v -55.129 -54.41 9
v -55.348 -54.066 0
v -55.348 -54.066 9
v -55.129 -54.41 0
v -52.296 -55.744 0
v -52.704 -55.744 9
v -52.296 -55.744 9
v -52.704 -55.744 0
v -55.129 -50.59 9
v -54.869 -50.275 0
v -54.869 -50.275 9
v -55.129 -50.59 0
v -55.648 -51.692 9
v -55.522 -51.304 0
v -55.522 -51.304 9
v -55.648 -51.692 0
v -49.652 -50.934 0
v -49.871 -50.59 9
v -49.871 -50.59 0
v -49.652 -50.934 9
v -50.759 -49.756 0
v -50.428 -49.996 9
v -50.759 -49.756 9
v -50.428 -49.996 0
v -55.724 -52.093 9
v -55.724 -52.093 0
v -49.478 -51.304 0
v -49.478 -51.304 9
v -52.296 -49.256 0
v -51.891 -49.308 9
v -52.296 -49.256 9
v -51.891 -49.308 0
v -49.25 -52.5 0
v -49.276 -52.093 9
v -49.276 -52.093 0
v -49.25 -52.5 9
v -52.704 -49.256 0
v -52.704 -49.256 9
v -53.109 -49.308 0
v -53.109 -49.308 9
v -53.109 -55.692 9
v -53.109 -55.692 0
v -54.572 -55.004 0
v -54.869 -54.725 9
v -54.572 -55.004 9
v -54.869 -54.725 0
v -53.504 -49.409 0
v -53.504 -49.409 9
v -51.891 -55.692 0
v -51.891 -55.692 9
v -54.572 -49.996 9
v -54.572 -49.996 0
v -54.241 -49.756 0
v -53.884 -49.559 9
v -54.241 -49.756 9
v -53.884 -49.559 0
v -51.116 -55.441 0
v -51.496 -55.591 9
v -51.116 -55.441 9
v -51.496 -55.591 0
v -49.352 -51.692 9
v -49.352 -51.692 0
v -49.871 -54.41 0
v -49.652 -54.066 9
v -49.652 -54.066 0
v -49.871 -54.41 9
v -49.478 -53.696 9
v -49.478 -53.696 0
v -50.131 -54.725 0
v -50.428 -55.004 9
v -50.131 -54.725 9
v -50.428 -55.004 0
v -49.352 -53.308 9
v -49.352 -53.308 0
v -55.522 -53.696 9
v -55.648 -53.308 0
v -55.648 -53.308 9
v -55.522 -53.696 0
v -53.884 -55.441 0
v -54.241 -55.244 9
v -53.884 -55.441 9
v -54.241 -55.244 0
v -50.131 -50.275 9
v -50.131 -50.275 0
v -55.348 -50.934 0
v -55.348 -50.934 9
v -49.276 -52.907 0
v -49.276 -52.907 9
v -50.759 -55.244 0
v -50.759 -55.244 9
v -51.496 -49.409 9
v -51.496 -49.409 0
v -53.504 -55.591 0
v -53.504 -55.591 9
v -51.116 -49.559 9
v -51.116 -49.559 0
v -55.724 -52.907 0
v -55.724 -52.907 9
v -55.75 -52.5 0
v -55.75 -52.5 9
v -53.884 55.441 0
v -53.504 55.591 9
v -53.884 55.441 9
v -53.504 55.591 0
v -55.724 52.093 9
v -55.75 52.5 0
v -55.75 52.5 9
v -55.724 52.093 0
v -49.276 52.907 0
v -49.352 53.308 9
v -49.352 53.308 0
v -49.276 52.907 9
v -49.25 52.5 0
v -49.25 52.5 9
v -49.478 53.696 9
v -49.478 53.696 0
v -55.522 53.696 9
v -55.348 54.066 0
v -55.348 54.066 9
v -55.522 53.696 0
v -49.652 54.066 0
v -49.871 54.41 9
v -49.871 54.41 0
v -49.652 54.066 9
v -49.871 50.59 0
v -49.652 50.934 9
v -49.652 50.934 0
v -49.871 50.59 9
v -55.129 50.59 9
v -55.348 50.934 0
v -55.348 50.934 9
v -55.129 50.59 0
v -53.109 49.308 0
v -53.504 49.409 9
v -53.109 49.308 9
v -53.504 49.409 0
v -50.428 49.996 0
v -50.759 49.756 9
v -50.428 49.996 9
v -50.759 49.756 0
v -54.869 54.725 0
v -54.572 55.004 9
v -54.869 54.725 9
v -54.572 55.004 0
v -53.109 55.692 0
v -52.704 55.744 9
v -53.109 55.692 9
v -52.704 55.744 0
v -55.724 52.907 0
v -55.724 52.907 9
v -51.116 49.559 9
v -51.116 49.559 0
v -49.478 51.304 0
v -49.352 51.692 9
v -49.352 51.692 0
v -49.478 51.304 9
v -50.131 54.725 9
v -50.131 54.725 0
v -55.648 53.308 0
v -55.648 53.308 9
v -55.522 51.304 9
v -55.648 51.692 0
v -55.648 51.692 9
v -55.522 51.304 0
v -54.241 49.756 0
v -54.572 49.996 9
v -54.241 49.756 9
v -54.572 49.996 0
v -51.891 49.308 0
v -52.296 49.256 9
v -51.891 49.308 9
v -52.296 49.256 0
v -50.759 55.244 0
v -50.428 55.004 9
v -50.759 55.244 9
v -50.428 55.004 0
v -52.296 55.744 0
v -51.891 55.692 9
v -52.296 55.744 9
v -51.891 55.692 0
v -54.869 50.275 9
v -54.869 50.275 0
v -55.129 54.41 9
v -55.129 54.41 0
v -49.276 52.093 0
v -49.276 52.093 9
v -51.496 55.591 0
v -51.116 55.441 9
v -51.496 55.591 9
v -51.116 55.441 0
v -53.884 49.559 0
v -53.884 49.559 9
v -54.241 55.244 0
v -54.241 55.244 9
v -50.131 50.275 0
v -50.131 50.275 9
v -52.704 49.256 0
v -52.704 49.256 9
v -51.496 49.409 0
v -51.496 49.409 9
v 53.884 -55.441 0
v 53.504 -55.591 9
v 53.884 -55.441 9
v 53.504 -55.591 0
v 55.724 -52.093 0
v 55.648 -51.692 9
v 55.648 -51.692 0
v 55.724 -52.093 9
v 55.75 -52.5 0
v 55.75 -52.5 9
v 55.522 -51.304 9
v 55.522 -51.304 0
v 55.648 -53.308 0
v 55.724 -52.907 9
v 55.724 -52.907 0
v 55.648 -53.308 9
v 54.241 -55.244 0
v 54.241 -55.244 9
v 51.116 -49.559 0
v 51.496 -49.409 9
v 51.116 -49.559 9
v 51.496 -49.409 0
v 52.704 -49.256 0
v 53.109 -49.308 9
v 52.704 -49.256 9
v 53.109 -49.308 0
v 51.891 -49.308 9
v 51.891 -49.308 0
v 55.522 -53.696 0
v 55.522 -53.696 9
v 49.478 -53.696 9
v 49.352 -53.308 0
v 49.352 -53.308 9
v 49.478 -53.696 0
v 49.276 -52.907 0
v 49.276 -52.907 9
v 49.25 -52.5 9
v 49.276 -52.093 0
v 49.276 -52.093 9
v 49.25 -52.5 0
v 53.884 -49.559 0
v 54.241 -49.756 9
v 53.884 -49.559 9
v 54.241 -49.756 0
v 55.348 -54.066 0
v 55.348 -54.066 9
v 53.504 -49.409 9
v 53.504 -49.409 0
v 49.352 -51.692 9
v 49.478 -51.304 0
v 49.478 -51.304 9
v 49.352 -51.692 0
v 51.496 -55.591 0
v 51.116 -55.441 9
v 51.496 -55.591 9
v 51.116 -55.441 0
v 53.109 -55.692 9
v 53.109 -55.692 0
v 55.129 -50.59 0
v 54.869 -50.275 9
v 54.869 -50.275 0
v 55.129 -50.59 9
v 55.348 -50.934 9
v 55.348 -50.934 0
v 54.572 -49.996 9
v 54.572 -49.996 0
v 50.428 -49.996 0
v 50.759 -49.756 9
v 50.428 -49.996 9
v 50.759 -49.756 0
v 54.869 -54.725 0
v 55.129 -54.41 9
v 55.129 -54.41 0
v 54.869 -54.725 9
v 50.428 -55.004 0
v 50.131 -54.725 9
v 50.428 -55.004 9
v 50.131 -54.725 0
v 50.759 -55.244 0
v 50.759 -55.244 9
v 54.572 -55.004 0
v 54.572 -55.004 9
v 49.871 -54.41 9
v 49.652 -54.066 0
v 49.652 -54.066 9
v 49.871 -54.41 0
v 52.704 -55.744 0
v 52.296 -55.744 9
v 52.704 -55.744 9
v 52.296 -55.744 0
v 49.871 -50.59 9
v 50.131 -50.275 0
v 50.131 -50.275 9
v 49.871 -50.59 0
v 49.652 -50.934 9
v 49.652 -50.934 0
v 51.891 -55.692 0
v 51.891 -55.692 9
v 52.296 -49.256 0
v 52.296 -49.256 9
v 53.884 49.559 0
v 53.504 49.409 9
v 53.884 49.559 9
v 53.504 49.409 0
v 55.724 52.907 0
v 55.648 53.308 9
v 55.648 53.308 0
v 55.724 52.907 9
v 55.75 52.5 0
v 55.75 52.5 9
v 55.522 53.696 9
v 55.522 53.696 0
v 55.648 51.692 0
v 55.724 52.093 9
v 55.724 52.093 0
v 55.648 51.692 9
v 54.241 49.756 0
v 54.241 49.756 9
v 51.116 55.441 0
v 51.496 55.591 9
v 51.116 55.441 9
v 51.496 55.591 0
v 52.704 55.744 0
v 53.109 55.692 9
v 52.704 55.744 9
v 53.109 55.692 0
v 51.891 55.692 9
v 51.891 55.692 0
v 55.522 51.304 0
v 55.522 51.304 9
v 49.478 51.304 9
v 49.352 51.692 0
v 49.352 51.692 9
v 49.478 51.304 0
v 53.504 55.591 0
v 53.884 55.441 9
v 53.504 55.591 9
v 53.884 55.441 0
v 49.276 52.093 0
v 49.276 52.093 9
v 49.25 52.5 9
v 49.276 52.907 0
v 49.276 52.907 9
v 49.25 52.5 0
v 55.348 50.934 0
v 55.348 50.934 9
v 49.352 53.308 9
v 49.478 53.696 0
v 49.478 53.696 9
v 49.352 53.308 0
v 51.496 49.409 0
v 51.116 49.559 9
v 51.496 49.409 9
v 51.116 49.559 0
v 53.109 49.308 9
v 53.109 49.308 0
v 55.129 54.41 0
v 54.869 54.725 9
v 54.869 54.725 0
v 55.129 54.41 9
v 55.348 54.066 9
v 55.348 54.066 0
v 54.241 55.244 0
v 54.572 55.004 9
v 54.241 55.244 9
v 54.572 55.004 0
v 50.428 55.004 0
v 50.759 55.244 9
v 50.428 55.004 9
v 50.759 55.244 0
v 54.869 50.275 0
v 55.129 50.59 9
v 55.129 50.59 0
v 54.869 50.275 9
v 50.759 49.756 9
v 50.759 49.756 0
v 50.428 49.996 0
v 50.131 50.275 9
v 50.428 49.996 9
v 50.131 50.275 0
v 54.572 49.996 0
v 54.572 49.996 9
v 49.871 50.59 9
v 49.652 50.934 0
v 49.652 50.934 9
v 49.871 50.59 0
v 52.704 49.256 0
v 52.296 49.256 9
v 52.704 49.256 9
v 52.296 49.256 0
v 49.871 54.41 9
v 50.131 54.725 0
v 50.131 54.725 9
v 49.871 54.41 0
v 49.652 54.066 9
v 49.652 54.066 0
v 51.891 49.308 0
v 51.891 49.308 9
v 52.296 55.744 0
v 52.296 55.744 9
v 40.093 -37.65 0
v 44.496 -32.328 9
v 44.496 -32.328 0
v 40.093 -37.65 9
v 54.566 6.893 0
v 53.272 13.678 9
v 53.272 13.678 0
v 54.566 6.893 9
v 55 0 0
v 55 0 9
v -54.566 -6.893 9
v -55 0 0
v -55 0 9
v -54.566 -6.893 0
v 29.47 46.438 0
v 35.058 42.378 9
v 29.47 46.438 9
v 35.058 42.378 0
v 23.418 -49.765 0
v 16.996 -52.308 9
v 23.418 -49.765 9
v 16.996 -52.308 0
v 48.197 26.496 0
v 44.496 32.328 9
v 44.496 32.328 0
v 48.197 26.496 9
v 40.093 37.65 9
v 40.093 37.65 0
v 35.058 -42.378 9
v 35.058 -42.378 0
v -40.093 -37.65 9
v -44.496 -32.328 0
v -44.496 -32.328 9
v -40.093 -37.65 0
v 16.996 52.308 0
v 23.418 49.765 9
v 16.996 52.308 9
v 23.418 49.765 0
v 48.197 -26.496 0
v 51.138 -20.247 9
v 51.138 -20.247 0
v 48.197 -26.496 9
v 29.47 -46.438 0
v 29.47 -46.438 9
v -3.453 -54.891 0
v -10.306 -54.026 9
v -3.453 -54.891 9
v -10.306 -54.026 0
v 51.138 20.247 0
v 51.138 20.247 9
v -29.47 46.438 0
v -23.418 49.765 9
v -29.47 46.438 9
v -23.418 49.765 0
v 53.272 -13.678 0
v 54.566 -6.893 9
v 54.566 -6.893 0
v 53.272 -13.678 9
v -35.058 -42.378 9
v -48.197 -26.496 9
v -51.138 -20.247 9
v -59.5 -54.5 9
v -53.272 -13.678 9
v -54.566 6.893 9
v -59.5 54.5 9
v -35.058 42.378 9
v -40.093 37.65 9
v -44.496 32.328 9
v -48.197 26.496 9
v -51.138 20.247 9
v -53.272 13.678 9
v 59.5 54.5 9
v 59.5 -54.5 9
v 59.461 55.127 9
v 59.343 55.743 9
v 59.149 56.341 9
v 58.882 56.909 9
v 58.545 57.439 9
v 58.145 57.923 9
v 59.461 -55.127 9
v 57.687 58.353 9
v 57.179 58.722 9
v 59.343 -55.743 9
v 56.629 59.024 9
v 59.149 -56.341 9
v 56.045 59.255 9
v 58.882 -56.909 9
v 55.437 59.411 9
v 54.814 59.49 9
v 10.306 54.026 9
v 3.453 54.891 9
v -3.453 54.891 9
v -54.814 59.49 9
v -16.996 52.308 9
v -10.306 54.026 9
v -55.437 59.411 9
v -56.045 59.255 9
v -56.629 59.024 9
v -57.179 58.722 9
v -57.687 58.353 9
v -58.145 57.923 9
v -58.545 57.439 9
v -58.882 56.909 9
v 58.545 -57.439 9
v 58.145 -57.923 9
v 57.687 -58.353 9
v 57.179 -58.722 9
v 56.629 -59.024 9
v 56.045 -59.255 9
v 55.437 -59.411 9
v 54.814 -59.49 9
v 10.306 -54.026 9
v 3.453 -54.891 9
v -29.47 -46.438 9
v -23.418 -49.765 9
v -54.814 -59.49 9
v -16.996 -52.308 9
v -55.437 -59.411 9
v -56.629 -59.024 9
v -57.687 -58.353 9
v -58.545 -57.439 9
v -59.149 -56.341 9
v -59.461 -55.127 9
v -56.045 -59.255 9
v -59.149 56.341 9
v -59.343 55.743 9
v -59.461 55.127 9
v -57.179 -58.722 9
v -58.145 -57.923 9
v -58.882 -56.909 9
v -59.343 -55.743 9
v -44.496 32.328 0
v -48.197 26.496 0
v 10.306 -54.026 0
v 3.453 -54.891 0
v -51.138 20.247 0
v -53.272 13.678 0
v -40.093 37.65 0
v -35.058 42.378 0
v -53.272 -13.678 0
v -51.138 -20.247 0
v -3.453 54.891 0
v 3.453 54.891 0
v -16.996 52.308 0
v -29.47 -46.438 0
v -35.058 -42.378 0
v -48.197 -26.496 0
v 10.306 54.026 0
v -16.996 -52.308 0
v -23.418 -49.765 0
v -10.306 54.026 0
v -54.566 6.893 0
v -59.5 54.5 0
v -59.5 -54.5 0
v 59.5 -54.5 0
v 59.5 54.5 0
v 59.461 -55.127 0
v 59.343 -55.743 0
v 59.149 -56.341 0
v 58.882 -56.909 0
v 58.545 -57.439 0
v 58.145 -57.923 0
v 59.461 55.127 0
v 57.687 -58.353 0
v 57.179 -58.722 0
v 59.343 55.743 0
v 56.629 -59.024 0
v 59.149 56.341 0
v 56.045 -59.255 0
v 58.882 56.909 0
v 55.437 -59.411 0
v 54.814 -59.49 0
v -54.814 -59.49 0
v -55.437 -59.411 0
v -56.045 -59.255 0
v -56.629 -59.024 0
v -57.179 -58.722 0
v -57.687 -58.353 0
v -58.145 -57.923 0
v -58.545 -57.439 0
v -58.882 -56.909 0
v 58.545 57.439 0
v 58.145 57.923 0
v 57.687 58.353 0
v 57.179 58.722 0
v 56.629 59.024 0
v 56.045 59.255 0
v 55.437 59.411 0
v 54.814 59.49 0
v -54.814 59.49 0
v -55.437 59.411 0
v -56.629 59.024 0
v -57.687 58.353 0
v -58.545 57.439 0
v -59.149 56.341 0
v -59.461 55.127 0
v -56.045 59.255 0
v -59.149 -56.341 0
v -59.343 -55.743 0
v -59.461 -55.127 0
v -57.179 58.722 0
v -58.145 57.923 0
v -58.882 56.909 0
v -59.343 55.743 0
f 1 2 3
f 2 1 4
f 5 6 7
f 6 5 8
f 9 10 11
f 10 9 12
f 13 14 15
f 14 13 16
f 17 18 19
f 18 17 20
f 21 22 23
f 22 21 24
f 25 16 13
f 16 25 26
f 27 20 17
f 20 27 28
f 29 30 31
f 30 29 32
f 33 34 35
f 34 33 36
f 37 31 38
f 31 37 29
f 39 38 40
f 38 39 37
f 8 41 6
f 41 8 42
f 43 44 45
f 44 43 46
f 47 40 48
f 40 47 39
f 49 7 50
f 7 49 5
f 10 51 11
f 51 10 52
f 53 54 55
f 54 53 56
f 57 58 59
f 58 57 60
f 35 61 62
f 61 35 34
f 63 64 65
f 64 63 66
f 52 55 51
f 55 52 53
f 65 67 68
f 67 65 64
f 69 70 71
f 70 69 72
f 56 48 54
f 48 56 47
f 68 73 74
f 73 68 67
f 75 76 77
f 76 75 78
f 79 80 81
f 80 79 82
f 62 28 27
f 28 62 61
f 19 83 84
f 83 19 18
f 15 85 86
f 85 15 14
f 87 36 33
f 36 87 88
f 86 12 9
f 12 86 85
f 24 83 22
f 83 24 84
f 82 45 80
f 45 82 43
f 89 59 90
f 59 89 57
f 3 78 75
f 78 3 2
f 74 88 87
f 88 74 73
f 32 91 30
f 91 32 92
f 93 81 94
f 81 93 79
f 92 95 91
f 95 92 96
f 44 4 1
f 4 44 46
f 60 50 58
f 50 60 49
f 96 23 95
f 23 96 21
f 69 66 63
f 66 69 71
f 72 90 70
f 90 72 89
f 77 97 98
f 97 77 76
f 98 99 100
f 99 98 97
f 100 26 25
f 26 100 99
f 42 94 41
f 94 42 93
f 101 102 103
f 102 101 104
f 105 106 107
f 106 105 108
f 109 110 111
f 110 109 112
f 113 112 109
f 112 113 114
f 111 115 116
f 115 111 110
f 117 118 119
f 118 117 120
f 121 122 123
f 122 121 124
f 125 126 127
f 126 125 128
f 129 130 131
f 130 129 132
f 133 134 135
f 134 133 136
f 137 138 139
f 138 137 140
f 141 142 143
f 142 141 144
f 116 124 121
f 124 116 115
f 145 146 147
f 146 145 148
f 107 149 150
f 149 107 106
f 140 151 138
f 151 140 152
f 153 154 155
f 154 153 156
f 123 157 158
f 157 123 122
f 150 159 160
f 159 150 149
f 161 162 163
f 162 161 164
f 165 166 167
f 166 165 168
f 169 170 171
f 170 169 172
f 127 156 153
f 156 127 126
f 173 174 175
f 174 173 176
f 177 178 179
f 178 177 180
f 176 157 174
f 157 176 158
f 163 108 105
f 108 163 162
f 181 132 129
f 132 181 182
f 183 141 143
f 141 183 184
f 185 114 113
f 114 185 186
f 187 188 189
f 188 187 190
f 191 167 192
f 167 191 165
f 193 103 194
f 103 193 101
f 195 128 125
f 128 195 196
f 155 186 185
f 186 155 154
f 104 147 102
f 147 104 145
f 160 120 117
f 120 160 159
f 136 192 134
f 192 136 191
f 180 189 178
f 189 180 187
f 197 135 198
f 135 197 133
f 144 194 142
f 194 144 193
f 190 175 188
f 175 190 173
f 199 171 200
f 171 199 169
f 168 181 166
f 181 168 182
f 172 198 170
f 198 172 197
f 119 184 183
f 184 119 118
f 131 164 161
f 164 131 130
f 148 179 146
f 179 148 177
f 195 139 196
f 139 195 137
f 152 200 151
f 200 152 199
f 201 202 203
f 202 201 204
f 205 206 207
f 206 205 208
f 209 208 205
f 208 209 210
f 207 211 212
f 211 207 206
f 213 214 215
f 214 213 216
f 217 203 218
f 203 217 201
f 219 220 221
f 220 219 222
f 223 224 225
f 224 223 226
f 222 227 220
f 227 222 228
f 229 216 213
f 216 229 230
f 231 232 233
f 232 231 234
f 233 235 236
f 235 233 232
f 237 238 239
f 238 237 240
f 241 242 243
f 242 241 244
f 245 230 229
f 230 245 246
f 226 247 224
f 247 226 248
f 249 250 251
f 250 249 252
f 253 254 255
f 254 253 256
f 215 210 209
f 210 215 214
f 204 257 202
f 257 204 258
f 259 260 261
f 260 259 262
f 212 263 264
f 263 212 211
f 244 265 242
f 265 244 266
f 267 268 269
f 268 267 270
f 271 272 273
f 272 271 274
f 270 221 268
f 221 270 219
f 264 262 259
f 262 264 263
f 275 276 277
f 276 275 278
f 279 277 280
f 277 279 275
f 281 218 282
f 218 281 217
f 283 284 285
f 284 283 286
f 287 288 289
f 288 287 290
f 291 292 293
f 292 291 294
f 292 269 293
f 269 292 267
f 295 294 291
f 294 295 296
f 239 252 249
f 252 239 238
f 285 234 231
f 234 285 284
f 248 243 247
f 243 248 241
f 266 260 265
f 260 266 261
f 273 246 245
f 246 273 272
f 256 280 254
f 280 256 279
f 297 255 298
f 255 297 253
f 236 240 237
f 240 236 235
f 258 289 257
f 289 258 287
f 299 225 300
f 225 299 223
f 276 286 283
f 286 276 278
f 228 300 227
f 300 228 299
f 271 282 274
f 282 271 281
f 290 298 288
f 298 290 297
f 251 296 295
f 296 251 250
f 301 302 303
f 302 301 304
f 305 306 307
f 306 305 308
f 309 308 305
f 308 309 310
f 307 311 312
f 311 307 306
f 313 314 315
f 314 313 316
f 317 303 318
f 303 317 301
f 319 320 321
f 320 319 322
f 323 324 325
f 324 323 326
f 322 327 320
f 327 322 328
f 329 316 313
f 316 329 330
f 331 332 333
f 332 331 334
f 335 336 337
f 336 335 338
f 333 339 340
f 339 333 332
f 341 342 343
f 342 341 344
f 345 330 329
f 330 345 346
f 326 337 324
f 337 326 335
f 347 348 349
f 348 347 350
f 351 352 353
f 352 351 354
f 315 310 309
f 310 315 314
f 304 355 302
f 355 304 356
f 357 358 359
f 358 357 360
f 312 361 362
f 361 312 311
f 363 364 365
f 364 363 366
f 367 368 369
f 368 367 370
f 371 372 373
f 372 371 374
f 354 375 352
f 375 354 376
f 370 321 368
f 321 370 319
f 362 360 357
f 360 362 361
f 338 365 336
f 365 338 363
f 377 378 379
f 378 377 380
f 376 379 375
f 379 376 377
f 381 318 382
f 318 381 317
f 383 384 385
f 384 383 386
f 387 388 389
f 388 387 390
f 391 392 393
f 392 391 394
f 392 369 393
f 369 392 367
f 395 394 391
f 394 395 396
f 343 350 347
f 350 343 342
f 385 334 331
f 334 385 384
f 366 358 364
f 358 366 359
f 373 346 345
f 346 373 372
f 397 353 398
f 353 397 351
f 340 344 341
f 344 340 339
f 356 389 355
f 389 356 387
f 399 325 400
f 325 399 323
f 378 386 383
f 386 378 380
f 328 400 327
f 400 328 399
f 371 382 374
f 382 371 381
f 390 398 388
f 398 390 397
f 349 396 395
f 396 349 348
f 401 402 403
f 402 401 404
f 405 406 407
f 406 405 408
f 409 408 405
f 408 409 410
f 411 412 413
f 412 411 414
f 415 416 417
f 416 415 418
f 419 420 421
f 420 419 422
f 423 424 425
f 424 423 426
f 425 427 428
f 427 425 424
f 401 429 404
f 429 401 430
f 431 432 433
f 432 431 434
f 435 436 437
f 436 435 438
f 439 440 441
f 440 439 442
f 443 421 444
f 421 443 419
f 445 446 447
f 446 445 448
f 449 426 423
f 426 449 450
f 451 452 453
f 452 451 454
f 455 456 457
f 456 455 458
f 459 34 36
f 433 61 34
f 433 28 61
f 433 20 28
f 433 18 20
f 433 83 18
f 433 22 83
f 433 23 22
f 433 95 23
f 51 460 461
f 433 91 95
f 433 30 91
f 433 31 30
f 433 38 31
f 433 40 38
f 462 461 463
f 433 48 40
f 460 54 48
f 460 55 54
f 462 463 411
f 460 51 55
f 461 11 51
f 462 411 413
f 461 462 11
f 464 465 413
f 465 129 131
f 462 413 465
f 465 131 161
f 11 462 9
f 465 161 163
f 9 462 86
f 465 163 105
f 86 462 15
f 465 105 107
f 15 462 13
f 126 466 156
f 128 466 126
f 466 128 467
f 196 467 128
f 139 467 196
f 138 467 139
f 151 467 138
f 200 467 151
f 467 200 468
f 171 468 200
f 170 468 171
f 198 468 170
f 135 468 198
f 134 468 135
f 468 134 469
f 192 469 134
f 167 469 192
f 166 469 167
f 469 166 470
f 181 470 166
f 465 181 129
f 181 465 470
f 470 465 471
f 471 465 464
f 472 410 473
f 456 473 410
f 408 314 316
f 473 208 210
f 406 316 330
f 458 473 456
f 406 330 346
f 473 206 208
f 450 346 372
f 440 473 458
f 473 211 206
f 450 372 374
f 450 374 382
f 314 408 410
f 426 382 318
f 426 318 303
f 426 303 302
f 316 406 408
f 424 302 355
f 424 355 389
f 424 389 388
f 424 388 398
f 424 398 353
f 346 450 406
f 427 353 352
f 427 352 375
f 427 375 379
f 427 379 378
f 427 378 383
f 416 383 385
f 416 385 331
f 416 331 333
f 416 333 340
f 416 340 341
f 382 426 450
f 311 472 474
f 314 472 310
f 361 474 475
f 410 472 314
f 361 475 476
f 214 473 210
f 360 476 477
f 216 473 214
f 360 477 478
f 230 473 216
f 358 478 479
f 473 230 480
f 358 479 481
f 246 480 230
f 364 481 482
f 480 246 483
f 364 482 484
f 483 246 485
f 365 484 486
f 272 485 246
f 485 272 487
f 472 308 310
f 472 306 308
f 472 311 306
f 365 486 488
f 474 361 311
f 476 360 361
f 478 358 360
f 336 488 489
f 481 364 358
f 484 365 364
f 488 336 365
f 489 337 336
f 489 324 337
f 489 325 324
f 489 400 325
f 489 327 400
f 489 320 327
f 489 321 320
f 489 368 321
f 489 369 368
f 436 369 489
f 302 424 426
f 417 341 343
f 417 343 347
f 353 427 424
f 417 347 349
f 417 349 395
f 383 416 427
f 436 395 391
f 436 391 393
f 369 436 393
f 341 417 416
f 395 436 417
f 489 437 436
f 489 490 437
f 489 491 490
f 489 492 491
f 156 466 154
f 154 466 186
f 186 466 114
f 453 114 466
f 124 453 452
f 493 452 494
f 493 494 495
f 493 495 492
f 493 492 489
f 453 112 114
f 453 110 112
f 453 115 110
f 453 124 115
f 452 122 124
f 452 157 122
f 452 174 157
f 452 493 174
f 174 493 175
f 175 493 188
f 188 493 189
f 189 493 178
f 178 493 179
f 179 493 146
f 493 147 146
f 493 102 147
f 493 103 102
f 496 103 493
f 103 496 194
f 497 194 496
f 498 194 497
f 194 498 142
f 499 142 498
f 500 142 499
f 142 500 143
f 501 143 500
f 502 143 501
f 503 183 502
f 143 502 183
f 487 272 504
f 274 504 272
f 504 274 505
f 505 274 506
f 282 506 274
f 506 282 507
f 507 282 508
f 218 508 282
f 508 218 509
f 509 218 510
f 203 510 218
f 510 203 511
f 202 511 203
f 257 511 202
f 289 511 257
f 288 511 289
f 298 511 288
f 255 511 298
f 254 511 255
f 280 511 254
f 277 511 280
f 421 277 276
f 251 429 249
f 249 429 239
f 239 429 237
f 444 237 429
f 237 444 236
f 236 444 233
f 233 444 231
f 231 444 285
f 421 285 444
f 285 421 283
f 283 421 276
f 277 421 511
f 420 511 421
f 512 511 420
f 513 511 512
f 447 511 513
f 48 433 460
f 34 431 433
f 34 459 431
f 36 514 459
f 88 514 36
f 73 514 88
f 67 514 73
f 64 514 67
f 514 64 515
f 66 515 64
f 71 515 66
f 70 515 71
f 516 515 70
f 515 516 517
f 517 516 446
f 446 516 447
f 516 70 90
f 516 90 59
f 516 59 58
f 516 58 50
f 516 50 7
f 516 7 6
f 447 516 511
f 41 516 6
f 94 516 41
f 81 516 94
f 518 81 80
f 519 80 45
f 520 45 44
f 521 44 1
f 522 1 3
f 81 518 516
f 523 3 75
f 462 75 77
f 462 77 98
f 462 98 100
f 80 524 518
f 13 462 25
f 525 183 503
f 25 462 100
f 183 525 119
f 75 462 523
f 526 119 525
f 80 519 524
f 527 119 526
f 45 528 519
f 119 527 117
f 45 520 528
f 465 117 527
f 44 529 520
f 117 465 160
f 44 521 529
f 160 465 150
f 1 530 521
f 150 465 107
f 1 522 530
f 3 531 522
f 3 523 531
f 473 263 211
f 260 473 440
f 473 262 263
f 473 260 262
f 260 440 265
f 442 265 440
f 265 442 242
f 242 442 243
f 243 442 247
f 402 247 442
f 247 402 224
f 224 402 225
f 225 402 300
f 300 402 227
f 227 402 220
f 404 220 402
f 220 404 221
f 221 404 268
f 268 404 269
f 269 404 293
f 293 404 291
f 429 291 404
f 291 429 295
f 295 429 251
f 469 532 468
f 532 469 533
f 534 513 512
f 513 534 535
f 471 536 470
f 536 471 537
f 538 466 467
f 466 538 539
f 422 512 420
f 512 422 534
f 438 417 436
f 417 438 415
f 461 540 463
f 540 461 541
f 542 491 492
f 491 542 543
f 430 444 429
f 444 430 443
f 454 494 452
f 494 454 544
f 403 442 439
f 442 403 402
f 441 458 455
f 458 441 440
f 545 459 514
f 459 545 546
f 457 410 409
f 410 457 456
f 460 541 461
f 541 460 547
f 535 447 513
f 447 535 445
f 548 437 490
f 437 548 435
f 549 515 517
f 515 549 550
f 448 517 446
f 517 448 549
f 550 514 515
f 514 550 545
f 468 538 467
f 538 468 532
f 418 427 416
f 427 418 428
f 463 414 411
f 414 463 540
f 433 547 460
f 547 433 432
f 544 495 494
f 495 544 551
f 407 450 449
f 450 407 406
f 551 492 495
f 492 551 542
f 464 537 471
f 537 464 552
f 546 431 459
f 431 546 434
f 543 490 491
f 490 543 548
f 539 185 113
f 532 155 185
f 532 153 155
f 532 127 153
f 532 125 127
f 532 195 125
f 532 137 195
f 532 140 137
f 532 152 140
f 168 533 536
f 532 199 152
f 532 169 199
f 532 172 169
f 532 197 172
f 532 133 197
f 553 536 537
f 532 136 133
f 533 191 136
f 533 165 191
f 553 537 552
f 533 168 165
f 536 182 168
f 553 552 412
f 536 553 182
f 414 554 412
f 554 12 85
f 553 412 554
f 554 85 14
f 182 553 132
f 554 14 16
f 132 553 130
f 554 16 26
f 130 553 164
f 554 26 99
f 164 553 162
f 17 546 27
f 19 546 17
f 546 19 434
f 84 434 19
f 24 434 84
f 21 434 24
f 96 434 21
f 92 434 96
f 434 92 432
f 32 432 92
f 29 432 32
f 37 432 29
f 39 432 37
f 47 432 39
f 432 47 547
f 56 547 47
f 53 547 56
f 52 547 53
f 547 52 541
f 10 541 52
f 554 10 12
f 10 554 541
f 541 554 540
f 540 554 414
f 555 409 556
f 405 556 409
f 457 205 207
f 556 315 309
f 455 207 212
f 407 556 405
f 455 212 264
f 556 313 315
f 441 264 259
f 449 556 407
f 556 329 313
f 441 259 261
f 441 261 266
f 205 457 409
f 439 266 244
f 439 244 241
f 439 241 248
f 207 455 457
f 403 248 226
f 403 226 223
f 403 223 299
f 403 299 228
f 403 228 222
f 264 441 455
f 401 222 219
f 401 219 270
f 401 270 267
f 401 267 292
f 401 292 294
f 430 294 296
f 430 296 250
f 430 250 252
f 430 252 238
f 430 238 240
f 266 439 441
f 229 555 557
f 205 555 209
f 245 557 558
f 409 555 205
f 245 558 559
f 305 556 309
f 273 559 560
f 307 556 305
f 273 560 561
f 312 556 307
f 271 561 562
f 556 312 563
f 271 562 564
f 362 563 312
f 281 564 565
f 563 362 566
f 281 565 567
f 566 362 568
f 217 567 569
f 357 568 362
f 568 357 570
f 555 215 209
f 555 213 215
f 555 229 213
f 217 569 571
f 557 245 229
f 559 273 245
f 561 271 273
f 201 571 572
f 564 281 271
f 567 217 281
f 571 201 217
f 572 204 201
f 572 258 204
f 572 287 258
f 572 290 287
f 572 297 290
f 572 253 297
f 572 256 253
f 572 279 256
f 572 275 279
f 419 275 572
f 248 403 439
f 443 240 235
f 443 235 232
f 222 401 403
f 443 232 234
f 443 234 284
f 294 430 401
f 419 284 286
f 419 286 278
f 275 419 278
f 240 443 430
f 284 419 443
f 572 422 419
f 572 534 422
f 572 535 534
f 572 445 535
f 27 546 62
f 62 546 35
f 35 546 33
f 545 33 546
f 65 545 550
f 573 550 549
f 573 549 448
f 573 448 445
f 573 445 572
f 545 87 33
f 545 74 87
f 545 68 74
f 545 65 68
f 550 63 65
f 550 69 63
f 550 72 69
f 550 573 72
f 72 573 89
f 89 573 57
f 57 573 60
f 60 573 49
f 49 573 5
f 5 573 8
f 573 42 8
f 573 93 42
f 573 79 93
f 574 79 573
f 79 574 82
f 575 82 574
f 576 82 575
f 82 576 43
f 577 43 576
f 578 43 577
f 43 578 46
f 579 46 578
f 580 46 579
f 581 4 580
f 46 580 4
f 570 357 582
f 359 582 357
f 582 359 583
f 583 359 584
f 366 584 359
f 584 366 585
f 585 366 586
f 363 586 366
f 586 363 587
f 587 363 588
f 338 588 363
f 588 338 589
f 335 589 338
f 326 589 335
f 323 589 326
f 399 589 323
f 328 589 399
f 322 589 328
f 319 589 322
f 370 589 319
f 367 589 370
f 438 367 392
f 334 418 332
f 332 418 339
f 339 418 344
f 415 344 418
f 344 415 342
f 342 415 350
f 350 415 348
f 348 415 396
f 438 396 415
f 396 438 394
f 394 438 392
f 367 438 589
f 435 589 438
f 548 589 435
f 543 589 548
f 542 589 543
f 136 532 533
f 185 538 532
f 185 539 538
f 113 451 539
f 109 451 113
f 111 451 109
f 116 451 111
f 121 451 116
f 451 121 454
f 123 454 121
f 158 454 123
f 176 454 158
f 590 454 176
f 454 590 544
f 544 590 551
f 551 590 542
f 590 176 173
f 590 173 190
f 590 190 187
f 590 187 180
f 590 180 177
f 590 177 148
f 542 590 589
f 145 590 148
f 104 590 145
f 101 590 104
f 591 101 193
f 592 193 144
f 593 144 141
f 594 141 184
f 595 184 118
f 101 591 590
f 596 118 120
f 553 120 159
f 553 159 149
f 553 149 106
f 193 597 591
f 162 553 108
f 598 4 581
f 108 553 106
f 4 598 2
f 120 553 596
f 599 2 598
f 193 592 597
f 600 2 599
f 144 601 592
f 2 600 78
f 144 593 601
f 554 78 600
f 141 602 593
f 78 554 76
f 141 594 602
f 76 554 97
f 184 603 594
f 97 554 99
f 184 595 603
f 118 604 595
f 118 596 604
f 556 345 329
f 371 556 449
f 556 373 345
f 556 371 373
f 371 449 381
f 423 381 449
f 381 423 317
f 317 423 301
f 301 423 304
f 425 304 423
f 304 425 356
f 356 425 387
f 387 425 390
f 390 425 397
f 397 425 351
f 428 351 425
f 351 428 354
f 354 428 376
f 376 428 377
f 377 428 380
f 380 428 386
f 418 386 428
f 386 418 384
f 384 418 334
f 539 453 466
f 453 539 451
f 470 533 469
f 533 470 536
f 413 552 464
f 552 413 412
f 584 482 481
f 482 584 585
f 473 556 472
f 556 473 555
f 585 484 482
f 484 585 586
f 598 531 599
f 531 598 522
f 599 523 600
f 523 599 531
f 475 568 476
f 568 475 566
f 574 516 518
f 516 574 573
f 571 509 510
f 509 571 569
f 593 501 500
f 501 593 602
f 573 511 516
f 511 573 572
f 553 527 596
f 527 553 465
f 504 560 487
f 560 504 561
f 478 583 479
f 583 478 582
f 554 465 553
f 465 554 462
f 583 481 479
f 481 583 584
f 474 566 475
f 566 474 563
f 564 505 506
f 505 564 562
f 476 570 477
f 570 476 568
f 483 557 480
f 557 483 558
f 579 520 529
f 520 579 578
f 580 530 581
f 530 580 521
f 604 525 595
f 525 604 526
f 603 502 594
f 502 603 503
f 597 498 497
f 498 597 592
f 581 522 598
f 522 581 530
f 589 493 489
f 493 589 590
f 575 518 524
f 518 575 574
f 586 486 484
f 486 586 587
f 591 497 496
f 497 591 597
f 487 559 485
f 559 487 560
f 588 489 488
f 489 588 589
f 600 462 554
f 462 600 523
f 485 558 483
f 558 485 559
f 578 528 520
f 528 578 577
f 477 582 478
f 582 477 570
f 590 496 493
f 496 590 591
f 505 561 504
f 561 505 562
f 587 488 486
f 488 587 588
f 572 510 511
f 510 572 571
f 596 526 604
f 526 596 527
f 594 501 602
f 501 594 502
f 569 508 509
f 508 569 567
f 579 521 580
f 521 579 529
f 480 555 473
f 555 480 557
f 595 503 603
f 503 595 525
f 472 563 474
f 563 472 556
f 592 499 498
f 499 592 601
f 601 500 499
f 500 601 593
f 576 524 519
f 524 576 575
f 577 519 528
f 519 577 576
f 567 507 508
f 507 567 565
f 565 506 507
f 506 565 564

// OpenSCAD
$fn = 50;


difference() {
	union() {
		hull() {
			translate(v = [-54.5000000000, 54.5000000000, 0]) {
				cylinder(h = 9, r = 5);
			}
			translate(v = [54.5000000000, 54.5000000000, 0]) {
				cylinder(h = 9, r = 5);
			}
			translate(v = [-54.5000000000, -54.5000000000, 0]) {
				cylinder(h = 9, r = 5);
			}
			translate(v = [54.5000000000, -54.5000000000, 0]) {
				cylinder(h = 9, r = 5);
			}
		}
	}
	union() {
		#translate(v = [-52.5000000000, -52.5000000000, -100.0000000000]) {
			cylinder(h = 200, r = 3.2500000000);
		}
		#translate(v = [-52.5000000000, 52.5000000000, -100.0000000000]) {
			cylinder(h = 200, r = 3.2500000000);
		}
		#translate(v = [52.5000000000, -52.5000000000, -100.0000000000]) {
			cylinder(h = 200, r = 3.2500000000);
		}
		#translate(v = [52.5000000000, 52.5000000000, -100.0000000000]) {
			cylinder(h = 200, r = 3.2500000000);
		}
		#cylinder(h = 9, r = 55.0000000000);
	}
}
